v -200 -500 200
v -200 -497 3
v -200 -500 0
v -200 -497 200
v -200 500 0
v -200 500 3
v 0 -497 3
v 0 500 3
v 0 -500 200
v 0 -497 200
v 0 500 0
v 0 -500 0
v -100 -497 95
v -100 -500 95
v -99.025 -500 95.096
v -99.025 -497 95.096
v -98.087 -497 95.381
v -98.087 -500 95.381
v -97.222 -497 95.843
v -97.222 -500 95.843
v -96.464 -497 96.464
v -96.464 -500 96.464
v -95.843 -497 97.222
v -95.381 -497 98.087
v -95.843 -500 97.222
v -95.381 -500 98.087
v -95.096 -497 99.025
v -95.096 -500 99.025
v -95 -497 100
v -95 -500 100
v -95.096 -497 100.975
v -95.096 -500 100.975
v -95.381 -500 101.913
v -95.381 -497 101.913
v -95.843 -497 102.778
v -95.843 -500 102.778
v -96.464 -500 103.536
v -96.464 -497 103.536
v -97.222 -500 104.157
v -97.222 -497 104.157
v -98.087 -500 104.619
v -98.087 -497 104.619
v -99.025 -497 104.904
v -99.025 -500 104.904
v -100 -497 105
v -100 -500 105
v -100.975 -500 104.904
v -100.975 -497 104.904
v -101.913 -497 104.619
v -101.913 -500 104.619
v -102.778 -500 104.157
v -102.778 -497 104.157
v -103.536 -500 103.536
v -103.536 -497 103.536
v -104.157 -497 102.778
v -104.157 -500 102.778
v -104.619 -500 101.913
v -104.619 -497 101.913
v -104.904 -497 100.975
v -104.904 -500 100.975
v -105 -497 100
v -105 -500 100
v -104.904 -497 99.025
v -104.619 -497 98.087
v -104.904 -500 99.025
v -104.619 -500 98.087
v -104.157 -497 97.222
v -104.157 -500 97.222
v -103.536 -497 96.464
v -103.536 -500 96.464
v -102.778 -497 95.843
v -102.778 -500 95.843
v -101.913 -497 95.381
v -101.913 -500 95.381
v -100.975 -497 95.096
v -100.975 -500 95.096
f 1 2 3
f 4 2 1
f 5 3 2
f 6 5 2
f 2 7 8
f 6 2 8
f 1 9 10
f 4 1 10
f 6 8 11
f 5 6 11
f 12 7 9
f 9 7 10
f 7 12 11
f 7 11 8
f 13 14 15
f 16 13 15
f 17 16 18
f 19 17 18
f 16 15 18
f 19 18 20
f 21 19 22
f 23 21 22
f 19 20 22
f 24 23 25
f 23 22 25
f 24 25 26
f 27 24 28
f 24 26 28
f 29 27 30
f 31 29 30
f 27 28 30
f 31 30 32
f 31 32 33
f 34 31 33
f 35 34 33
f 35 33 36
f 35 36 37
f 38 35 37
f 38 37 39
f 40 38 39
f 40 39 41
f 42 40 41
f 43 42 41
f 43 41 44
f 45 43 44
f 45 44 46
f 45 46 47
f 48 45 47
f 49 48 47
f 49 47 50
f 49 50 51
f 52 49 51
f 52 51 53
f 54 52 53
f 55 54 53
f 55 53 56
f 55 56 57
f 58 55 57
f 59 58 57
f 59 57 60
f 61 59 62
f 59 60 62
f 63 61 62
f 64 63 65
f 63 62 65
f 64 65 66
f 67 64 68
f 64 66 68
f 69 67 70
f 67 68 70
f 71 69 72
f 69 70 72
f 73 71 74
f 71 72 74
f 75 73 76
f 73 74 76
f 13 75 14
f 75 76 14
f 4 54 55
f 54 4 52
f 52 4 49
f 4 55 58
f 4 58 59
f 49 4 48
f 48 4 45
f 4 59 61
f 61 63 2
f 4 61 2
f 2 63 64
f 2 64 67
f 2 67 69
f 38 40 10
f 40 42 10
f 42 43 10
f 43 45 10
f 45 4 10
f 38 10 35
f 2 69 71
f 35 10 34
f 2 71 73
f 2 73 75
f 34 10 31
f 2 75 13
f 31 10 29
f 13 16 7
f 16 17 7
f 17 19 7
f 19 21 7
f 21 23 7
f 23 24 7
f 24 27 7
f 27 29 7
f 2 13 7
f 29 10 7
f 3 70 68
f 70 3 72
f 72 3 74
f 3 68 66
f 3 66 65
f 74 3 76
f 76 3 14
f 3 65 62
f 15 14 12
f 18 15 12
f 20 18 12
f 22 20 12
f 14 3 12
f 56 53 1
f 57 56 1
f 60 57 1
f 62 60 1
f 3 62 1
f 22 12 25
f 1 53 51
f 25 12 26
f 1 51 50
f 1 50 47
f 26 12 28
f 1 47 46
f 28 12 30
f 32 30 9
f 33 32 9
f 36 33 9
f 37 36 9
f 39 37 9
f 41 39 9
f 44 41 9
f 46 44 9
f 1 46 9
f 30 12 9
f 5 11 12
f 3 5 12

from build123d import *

# Parameters (mm, degrees)
EXTRUDE_THIN1_DEPTH = 200
SKETCH2_R           = 5
CUT_EXTRUDE1_DEPTH  = 10


with BuildPart() as part:
    # Sketch1 → Extrude-Thin1 (new body)
    with BuildSketch(Plane(origin=(0, 0, 0), x_dir=(0, 0, -1), z_dir=(1, 0, 0))):
        Polygon((0, 500), (0, -500), (-200, -500), (-200, -497), (-3, -497), (-3, 500), align=None)
    extrude(amount=-EXTRUDE_THIN1_DEPTH)

    # Sketch2 → Cut-Extrude1 (cut)
    with BuildSketch(Plane.XZ.offset(500)):
        with Locations(Location((-100, 100, 0), (0, 0, 270))):
            Circle(SKETCH2_R)
    extrude(amount=-CUT_EXTRUDE1_DEPTH, mode=Mode.SUBTRACT)


solid = part.part
